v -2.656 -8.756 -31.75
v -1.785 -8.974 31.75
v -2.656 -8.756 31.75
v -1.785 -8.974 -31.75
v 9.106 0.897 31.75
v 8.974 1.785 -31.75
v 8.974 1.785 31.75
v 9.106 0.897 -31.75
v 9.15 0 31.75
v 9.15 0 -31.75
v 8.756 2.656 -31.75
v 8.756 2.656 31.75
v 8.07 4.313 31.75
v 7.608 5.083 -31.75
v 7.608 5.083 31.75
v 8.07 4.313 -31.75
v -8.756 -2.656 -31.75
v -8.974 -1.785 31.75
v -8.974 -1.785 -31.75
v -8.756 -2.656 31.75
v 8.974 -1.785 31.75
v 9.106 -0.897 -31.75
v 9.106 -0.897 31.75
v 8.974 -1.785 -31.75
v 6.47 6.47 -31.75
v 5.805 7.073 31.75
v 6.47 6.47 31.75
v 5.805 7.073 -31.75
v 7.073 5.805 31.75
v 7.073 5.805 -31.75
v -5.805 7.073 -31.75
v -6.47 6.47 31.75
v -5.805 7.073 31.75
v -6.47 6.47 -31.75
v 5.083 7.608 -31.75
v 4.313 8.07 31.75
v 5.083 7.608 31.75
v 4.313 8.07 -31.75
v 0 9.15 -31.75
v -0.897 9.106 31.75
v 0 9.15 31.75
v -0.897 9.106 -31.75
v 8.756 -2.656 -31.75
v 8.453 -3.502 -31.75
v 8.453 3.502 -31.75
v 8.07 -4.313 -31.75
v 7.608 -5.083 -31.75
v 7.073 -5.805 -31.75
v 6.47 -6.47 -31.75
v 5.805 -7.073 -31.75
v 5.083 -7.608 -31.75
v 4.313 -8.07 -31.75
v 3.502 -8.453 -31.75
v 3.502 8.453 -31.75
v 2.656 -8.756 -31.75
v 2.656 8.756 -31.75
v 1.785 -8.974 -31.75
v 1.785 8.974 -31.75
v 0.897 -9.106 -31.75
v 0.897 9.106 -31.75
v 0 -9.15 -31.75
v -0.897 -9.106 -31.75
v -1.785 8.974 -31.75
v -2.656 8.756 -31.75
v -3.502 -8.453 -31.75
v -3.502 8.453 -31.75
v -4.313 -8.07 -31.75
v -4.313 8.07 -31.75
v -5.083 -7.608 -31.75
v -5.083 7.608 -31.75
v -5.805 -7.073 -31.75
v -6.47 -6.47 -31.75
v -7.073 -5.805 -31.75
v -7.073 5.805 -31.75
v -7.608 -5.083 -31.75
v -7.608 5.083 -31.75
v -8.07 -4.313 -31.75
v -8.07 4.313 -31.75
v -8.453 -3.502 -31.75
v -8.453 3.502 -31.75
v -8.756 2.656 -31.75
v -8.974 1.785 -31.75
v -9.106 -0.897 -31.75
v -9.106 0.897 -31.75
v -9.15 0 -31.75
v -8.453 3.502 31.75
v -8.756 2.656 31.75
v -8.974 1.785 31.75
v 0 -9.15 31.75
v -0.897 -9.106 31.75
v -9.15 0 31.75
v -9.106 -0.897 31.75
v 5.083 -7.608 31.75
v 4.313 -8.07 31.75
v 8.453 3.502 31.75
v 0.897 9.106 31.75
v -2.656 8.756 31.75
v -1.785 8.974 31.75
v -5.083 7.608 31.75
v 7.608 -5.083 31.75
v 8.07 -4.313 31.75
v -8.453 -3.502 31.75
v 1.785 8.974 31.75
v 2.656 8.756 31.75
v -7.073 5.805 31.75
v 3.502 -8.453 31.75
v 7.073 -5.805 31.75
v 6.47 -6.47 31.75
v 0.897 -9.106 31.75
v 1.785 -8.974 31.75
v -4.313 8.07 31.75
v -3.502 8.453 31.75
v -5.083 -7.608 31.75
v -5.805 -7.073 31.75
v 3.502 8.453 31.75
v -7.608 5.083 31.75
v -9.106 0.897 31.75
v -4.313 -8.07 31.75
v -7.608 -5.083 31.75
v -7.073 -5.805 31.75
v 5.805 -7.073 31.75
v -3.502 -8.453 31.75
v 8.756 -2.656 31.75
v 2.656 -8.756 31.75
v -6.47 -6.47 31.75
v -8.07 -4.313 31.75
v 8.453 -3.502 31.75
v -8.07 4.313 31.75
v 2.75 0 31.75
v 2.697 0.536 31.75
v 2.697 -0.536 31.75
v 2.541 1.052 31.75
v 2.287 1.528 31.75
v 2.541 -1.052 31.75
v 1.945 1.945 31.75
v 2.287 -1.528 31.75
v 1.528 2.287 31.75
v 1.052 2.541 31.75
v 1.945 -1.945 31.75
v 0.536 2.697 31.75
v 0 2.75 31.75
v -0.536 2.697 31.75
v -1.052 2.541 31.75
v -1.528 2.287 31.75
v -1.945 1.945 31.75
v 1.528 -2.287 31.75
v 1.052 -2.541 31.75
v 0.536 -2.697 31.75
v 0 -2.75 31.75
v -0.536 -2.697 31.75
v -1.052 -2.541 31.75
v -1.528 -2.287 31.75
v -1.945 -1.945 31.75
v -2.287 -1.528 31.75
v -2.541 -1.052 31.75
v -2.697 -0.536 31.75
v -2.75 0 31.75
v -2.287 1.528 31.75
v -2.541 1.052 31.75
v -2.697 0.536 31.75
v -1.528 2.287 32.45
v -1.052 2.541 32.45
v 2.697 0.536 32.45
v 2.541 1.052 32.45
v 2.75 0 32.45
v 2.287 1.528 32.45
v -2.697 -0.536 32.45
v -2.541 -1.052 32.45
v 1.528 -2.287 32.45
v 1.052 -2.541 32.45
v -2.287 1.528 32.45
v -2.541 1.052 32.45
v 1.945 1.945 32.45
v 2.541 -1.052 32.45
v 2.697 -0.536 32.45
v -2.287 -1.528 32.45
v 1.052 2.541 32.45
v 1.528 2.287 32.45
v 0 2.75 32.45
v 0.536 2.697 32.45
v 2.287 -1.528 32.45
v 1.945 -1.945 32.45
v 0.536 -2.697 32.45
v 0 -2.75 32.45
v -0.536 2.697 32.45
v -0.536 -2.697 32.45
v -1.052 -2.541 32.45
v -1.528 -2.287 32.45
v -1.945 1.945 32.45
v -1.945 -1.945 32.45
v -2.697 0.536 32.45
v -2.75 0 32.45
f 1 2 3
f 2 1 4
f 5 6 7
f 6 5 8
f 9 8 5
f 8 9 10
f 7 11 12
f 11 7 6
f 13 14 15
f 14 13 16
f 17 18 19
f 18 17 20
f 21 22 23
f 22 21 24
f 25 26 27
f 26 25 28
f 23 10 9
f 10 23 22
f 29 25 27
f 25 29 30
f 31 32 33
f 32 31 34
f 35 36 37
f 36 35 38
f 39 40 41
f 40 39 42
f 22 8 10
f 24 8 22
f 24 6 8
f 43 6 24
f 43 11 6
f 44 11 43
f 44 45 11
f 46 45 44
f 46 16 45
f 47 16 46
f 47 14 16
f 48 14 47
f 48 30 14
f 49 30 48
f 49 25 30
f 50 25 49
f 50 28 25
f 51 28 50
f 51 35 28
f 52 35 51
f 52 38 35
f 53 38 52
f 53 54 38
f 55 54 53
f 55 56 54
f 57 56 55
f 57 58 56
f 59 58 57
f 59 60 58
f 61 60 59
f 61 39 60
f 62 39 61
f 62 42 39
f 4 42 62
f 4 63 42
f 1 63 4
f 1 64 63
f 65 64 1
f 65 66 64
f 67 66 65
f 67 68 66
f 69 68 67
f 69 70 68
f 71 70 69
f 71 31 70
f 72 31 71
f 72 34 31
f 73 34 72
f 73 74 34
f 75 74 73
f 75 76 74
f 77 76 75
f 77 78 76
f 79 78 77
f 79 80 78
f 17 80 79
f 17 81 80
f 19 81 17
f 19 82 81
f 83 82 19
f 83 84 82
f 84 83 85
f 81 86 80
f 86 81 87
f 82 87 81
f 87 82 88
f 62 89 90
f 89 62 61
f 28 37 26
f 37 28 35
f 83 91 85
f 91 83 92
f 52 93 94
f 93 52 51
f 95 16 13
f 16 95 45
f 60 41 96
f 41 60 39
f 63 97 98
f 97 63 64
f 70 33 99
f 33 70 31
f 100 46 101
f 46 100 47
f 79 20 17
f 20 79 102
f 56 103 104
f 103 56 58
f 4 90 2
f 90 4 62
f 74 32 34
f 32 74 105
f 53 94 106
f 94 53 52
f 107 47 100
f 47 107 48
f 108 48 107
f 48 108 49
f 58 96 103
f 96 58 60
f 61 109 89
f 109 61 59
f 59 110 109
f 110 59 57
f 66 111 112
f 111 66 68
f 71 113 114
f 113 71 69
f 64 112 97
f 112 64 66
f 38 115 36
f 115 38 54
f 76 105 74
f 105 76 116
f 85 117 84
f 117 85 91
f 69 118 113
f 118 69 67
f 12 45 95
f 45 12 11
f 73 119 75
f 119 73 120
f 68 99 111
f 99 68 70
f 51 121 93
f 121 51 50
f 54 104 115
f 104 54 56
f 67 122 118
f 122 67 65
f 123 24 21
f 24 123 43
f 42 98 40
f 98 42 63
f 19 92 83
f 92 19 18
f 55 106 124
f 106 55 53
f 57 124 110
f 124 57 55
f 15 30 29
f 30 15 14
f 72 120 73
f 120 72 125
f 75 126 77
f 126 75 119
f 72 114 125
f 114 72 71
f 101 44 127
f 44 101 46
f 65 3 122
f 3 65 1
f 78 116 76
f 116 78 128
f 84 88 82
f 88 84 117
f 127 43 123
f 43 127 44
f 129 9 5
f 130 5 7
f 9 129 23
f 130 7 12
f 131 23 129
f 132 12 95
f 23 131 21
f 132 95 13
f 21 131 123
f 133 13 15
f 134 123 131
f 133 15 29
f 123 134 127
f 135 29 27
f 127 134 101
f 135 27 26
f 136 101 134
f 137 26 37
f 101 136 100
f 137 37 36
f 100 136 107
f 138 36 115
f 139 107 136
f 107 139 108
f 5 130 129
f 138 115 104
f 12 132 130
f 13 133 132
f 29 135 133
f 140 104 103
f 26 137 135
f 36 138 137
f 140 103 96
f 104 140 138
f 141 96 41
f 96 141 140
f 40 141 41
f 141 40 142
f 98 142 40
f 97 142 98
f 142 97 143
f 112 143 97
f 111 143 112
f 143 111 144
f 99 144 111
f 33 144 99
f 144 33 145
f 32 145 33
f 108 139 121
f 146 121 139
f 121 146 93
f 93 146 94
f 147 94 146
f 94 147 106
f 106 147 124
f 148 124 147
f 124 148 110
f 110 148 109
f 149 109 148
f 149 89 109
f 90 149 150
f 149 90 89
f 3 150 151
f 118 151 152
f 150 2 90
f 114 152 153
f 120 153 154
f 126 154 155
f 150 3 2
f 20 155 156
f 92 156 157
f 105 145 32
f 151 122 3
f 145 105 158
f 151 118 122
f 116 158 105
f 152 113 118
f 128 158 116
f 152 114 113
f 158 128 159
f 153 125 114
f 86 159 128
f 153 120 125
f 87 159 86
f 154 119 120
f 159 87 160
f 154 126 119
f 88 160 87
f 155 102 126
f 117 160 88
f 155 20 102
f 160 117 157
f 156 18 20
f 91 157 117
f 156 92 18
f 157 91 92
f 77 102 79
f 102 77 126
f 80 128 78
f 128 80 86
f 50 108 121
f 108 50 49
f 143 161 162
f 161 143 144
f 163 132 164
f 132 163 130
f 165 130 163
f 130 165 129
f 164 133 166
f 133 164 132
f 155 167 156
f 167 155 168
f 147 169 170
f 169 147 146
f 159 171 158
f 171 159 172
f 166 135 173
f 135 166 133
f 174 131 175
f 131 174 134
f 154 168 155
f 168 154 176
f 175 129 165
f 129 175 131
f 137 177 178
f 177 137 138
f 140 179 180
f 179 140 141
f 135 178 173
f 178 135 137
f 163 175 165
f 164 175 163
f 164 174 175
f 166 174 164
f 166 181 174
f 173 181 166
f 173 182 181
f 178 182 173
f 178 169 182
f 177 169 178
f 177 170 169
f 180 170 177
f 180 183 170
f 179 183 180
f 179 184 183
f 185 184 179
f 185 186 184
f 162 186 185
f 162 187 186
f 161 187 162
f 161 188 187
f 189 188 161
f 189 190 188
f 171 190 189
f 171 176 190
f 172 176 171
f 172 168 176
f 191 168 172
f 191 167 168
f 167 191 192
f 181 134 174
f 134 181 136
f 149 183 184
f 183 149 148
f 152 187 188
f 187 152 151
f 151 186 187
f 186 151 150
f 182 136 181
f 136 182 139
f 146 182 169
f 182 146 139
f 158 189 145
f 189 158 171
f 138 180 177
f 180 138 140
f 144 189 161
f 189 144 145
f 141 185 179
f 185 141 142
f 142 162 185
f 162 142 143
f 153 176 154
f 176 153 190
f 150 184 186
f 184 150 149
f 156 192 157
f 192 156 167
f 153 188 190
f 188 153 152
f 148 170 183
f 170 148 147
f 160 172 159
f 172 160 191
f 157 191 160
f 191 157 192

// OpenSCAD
// Parameters
height_mm = 65; //[32.5:130:0.1]
diameter_mm = 18.3; //[9.15:36.6:0.1]
body_diameter_mm = 18.3; //[9.15:36.6:0.1]
body_height_mm = 63.5; //[31.75:127:0.1]
positive_terminal_diameter_mm = 5.5; //[2.75:11:0.1]
positive_terminal_height_mm = 1.5; //[0.75:3:0.1]
negative_terminal_diameter_mm = 6; //[3:12:0.1]
negative_terminal_height_mm = 0.2; //[0.1:0.6:0.05]
overlap_mm = 0.8; //[0.2:2:0.1]

// Battery - complete geometry
module battery() {
  union() {
    // Main cylindrical body
    color("DimGray") {
      translate([0, 0, 0])
        cylinder(h=body_height_mm, r=body_diameter_mm/2, center=true, $fn=64);
    }
    // Positive terminal button
    color("Silver") {
      translate([0, 0, body_height_mm/2 + positive_terminal_height_mm/2 - overlap_mm])
        cylinder(h=positive_terminal_height_mm, r=positive_terminal_diameter_mm/2, center=true, $fn=32);
    }
    // Negative terminal contact
    color("Silver") {
      translate([0, 0, -body_height_mm/2 - negative_terminal_height_mm/2 + overlap_mm])
        cylinder(h=negative_terminal_height_mm, r=negative_terminal_diameter_mm/2, center=true, $fn=32);
    }
  }
}

// Assembly
module assembly() {
  battery();
}

assembly();
